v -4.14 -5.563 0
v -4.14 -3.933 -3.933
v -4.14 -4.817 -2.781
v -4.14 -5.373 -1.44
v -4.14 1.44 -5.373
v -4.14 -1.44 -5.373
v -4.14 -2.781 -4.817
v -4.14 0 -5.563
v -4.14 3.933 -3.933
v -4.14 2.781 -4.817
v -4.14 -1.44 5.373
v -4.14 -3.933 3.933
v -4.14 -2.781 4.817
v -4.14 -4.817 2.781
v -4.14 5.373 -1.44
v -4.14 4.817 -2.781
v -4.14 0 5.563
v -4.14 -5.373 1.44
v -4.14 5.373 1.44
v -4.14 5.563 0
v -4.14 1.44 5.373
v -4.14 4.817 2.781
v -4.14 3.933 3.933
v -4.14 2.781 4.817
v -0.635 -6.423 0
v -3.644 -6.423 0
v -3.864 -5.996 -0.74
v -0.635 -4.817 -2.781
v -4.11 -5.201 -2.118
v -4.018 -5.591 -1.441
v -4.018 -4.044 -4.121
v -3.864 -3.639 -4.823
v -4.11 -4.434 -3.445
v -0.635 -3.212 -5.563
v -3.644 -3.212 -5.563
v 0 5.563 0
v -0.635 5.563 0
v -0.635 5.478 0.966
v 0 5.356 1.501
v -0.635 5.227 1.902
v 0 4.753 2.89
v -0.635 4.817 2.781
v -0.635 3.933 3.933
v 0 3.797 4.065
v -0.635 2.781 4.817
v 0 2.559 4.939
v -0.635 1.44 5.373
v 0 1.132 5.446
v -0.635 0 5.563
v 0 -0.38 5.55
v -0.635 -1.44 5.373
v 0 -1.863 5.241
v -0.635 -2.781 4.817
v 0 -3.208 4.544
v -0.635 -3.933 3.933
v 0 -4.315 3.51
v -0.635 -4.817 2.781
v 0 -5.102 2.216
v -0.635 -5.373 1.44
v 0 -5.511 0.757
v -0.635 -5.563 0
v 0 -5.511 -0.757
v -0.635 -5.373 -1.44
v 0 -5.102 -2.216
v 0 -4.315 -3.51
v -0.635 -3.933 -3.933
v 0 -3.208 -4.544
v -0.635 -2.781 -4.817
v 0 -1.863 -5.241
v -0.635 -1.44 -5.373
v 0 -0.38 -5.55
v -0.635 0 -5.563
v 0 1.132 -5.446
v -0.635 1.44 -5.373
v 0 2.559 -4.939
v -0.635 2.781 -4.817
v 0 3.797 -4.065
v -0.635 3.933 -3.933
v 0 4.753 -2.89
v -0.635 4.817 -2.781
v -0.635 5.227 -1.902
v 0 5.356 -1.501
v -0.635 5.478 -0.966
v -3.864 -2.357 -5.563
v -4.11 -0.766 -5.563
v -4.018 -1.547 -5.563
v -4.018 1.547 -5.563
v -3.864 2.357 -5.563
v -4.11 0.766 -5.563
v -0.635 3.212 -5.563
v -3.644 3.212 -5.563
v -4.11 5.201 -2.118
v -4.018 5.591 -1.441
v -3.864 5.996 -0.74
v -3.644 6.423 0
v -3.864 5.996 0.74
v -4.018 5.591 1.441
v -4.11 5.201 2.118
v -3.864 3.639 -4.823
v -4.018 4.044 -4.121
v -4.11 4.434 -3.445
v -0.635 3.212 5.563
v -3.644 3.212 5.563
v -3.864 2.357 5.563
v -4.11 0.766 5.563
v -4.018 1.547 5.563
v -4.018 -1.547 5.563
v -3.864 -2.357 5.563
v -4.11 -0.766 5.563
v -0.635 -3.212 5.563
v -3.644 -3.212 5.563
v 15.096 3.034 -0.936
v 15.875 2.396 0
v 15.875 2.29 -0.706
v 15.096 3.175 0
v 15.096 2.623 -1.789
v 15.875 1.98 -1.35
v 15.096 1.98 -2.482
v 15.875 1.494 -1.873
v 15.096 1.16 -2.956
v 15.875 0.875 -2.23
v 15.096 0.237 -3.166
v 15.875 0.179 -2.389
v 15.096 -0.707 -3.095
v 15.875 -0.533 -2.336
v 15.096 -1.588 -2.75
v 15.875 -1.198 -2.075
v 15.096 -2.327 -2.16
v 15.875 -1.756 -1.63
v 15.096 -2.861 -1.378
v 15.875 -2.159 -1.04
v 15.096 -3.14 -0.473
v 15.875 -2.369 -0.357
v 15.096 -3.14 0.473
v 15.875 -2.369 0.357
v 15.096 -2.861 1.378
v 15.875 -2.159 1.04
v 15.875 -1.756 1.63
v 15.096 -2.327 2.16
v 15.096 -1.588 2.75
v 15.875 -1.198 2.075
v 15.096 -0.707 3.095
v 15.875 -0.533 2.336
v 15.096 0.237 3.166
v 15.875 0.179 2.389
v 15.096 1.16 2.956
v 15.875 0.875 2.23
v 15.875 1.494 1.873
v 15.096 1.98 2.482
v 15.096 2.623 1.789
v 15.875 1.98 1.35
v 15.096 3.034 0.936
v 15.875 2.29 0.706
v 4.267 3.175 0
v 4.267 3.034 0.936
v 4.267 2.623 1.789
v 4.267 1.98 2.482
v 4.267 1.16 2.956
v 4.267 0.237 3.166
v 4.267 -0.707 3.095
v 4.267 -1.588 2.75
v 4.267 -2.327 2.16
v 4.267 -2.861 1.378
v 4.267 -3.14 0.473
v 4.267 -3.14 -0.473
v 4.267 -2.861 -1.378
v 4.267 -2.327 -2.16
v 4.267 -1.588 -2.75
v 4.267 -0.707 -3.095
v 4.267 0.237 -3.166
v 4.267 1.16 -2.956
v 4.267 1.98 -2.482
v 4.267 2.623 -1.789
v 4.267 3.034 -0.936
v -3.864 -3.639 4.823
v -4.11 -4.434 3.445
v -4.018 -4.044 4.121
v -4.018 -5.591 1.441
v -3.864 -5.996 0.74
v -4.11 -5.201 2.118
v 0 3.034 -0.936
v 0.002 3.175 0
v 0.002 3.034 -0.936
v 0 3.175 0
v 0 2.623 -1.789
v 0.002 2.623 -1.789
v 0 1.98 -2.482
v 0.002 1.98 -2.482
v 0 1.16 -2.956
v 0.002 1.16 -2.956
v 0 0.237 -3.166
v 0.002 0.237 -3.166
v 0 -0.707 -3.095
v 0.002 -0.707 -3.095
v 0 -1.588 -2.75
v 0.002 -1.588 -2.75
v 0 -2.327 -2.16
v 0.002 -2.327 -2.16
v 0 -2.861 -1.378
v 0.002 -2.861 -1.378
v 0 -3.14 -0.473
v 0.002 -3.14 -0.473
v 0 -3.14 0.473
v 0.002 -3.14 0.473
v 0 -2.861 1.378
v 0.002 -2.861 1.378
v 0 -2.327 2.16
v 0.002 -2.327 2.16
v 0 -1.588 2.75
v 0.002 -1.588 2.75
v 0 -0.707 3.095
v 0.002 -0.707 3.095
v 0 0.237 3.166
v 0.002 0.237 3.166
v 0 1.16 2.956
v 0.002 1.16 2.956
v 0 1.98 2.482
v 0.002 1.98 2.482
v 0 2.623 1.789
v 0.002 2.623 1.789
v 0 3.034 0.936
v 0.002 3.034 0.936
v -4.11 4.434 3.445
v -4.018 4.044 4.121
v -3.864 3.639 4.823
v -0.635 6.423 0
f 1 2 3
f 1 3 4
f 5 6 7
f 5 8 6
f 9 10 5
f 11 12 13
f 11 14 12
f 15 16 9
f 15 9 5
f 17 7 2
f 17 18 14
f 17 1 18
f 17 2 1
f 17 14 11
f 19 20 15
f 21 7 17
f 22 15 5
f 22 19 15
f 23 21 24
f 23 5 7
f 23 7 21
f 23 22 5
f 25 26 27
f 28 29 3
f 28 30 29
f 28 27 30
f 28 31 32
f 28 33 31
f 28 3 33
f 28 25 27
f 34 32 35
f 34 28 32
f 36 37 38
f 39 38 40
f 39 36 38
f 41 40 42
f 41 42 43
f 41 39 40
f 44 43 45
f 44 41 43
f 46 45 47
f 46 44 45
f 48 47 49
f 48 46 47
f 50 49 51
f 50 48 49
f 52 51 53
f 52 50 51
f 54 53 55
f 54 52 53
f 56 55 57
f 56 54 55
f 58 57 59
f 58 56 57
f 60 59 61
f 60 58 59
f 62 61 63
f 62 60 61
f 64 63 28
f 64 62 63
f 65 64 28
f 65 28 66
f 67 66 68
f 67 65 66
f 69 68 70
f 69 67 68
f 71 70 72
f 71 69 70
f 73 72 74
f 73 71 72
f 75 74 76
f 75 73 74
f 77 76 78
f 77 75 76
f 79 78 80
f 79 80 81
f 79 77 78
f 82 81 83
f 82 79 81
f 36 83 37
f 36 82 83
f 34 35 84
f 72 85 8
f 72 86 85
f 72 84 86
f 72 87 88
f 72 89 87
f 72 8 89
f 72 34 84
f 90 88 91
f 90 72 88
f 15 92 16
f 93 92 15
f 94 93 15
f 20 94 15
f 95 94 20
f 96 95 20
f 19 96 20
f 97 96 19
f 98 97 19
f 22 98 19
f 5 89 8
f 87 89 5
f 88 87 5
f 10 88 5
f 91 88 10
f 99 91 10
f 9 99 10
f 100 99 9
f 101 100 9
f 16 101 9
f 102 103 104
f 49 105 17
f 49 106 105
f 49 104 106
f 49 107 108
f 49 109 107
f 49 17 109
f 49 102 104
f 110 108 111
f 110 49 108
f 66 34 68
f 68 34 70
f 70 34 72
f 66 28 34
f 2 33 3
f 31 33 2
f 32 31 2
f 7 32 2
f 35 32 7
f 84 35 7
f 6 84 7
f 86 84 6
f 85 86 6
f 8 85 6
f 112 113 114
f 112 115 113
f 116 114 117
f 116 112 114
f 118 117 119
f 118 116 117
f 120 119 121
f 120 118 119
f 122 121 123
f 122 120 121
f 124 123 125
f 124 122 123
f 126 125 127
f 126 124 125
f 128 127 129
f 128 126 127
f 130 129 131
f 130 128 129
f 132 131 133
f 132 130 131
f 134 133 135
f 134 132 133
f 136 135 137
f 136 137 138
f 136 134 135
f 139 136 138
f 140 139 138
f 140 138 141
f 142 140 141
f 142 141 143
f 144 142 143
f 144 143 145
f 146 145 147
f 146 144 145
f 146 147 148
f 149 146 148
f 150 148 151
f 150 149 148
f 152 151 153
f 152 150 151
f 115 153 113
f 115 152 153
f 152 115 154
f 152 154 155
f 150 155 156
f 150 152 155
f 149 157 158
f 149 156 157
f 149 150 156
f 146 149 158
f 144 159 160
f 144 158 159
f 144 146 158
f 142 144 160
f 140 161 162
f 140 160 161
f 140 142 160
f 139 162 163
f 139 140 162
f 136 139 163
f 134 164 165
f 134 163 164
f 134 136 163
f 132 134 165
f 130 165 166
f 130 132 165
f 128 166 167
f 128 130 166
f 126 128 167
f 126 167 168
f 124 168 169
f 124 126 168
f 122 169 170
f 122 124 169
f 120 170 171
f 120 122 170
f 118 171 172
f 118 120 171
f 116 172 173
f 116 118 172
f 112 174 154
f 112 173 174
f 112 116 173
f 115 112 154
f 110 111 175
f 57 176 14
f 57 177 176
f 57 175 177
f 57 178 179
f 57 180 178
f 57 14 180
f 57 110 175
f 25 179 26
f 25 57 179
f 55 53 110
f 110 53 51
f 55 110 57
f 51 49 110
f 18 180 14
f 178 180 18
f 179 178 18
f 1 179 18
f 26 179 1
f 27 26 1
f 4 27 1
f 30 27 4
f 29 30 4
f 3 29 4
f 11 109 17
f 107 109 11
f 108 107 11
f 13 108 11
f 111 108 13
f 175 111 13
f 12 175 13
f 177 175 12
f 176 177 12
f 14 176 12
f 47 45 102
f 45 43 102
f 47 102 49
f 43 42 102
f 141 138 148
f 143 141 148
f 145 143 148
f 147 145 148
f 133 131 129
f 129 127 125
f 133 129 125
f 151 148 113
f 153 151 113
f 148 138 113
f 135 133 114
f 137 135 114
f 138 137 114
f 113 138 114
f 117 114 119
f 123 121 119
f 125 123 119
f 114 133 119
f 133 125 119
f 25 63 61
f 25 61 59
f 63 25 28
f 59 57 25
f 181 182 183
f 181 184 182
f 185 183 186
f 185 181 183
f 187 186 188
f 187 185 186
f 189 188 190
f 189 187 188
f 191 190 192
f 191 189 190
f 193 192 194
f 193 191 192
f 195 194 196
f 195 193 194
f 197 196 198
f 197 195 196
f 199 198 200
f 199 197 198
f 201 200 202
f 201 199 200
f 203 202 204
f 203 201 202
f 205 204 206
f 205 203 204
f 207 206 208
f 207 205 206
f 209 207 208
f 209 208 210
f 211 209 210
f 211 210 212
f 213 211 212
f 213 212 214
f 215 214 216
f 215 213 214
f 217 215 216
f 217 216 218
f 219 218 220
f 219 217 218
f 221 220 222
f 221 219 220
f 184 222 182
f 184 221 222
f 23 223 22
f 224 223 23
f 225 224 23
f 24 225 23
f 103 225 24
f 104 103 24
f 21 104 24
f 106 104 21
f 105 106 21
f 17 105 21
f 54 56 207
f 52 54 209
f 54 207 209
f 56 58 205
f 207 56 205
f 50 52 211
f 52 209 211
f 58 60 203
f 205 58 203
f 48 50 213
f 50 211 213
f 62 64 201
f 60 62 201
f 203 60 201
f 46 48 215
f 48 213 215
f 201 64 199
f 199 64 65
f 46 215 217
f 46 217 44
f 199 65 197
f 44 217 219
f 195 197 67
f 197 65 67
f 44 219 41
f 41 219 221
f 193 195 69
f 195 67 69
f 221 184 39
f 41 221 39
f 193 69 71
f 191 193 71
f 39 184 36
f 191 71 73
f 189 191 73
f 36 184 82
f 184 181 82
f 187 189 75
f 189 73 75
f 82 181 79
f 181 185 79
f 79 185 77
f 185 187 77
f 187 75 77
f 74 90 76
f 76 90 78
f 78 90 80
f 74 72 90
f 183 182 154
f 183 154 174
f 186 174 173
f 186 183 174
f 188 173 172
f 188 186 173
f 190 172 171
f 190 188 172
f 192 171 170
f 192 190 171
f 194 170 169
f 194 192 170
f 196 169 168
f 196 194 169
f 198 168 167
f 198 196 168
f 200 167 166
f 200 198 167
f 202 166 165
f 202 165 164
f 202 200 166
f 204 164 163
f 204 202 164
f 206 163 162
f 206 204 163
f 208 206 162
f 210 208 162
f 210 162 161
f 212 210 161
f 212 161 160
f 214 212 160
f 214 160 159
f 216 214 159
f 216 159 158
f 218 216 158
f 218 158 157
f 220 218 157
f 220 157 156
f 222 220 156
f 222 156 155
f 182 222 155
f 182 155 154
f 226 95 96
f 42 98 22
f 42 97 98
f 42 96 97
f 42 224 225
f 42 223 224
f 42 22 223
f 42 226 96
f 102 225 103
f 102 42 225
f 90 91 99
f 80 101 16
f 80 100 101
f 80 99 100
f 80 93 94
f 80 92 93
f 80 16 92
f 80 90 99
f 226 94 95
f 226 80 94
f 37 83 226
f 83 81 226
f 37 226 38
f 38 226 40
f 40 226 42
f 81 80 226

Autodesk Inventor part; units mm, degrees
ref_plane "YZ Plane" through (0, 0, 0) normal (1, 0, 0) x (0, 1, 0)
ref_plane "XZ Plane" through (0, 0, 0) normal (0, 1, 0) x (-1, 0, 0)
sketch "Sketch1" plane through (0, 0, 0) normal (0, 0, 1) x (1, 0, 0)
  line L0 (0, 5.5626) -> (0, 3.175)
  line L1 (4.2672, 3.175) -> (15.875, 3.175)
  line L2 (15.875, 3.175) -> (15.875, 0)
  line L3 (15.875, 0) -> (-0.6351, 0)
  line L4 (-3.9371, 0) -> (19.177, 0) projected
  line L5 (-0.6351, 0) -> (-0.6351, 5.5626)
  line L6 (-0.6351, 5.5626) -> (0, 5.5626)
  line L7 (4.2672, 3.175) -> (0.0024, 3.175)
  line L8 (0.0024, 3.175) -> (0, 3.175)
  line L9 (0, -1.1125) -> (0, 6.6751) projected
  dimension "d0" = 15.875
  dimension "d1" = 11.6078
  dimension "d2" = 6.35
  dimension "d9" = 0.6351
  dimension "d10" = 11.1252
  dimension "d13" = 4.2648
  dimension "d14" = 6.35
revolve "Body" add sketch "Sketch1" angle 360 about axis through (15.875, 0, 0) along (-1, 0, 0)
sketch "Sketch2" plane through (-0.6351, 0, 0) normal (-1, 0, 0) x (0, 0, 1)
  line L0 (0, 6.4231) -> (5.5626, 3.2116)
  line L1 (5.5626, 3.2116) -> (5.5626, -3.2116)
  line L2 (5.5626, -3.2116) -> (0, -6.4231)
  line L3 (0, -6.4231) -> (-5.5626, -3.2116)
  line L4 (-5.5626, -3.2116) -> (-5.5626, 3.2116)
  line L5 (-5.5626, 3.2116) -> (0, 6.4231)
  point P0 (0, 0)
  point P1 (0, 0)
  dimension "d11" = 11.1252
extrude "Head" add sketch "Sketch2" along normal blind 3.5052
sketch "Sketch4" plane through (0, 0, 0) normal (0, 0, 1) x (1, 0, 0)
  line L0 (-4.1403, 5.5626) -> (-4.1403, 6.4231)
  line L1 (-4.1403, 6.4231) -> (-3.6435, 6.4231)
  line L2 (-3.6435, 6.4231) -> (-4.1403, 5.5626)
  line L3 (-4.8413, 0) -> (0.0659, 0) projected
  line L4 (-0.6351, 6.4231) -> (-4.1403, 6.4231) projected
  line L5 (-4.1403, 3.2116) -> (-4.1403, 6.4231) projected
  dimension "d5" = 30
  dimension "d19" = 11.1252
revolve "Chamfer1" cut sketch "Sketch4" angle 360 about axis through (-10, 0, 0) along (1, 0, 0)
thread "Thread" size "1/4-20 UNC" class "2A" standard "ANSI Unified Screw Threads" length 11.6078
chamfer "Chamfer2" distance 0.779 distance2 0.7791 1 edges at (15.875, -3.175, 0) measured on face at (15.875, -0.7017, 0.0433)
ref_plane "Work Plane1" through (1.525, 0, 0) normal (0, 0, 1) x (1, 0, 0)
equation "\"d0\" = NLG"
equation "\"d1\" = GEL"
equation "\"d2\" = GD"
equation "\"d10\" = SD2"
equation "\"d14\" = BDM"
equation "\"d11\" = SW"
equation "\"d3\" = KOH - SD"
equation "\"d5\" = ANG1"
equation "\"d19\" = SW0"
equation "\"d15\" = GEL"
equation "\"d6\" = -0.5 * SPD + 0.5 * GD"
equation "\"NLG\" = 15.875"
equation "\"GD\" = 6.35"
equation "\"BDM\" = 6.35"
equation "\"KOH\" = 4.1402"
equation "\"GEL\" = 11.6078"
equation "\"SW\" = 11.1252"
equation "\"SW0\" = SW"
equation "\"SPD\" = GD1"
equation "\"SD2\" = SW"
equation "\"SD\" = 0.635"
equation "\"ANG1\" = 30deg"
equation "\"GAL\" = 4.26466"
equation "\"GUL\" = 0.77902"
equation "\"RR\" = 0.381"
equation "\"WFT\" = SD"
equation "\"GD1\" = 4.79196"
equation "\"THREADDIA\" = 6.35"
equation "\"SDH\" = SW"
equation "\"SDHG\" = 0.00254"
equation "\"TOA\" = 30deg"
equation "\"FAWI\" = 45deg"
equation "\"NND\" = 6.35"
equation "\"E0\" = 12.84961"
properties part number "AS 2465 - 1/4 x 5/8  UNC" material "Steel, Mild"
